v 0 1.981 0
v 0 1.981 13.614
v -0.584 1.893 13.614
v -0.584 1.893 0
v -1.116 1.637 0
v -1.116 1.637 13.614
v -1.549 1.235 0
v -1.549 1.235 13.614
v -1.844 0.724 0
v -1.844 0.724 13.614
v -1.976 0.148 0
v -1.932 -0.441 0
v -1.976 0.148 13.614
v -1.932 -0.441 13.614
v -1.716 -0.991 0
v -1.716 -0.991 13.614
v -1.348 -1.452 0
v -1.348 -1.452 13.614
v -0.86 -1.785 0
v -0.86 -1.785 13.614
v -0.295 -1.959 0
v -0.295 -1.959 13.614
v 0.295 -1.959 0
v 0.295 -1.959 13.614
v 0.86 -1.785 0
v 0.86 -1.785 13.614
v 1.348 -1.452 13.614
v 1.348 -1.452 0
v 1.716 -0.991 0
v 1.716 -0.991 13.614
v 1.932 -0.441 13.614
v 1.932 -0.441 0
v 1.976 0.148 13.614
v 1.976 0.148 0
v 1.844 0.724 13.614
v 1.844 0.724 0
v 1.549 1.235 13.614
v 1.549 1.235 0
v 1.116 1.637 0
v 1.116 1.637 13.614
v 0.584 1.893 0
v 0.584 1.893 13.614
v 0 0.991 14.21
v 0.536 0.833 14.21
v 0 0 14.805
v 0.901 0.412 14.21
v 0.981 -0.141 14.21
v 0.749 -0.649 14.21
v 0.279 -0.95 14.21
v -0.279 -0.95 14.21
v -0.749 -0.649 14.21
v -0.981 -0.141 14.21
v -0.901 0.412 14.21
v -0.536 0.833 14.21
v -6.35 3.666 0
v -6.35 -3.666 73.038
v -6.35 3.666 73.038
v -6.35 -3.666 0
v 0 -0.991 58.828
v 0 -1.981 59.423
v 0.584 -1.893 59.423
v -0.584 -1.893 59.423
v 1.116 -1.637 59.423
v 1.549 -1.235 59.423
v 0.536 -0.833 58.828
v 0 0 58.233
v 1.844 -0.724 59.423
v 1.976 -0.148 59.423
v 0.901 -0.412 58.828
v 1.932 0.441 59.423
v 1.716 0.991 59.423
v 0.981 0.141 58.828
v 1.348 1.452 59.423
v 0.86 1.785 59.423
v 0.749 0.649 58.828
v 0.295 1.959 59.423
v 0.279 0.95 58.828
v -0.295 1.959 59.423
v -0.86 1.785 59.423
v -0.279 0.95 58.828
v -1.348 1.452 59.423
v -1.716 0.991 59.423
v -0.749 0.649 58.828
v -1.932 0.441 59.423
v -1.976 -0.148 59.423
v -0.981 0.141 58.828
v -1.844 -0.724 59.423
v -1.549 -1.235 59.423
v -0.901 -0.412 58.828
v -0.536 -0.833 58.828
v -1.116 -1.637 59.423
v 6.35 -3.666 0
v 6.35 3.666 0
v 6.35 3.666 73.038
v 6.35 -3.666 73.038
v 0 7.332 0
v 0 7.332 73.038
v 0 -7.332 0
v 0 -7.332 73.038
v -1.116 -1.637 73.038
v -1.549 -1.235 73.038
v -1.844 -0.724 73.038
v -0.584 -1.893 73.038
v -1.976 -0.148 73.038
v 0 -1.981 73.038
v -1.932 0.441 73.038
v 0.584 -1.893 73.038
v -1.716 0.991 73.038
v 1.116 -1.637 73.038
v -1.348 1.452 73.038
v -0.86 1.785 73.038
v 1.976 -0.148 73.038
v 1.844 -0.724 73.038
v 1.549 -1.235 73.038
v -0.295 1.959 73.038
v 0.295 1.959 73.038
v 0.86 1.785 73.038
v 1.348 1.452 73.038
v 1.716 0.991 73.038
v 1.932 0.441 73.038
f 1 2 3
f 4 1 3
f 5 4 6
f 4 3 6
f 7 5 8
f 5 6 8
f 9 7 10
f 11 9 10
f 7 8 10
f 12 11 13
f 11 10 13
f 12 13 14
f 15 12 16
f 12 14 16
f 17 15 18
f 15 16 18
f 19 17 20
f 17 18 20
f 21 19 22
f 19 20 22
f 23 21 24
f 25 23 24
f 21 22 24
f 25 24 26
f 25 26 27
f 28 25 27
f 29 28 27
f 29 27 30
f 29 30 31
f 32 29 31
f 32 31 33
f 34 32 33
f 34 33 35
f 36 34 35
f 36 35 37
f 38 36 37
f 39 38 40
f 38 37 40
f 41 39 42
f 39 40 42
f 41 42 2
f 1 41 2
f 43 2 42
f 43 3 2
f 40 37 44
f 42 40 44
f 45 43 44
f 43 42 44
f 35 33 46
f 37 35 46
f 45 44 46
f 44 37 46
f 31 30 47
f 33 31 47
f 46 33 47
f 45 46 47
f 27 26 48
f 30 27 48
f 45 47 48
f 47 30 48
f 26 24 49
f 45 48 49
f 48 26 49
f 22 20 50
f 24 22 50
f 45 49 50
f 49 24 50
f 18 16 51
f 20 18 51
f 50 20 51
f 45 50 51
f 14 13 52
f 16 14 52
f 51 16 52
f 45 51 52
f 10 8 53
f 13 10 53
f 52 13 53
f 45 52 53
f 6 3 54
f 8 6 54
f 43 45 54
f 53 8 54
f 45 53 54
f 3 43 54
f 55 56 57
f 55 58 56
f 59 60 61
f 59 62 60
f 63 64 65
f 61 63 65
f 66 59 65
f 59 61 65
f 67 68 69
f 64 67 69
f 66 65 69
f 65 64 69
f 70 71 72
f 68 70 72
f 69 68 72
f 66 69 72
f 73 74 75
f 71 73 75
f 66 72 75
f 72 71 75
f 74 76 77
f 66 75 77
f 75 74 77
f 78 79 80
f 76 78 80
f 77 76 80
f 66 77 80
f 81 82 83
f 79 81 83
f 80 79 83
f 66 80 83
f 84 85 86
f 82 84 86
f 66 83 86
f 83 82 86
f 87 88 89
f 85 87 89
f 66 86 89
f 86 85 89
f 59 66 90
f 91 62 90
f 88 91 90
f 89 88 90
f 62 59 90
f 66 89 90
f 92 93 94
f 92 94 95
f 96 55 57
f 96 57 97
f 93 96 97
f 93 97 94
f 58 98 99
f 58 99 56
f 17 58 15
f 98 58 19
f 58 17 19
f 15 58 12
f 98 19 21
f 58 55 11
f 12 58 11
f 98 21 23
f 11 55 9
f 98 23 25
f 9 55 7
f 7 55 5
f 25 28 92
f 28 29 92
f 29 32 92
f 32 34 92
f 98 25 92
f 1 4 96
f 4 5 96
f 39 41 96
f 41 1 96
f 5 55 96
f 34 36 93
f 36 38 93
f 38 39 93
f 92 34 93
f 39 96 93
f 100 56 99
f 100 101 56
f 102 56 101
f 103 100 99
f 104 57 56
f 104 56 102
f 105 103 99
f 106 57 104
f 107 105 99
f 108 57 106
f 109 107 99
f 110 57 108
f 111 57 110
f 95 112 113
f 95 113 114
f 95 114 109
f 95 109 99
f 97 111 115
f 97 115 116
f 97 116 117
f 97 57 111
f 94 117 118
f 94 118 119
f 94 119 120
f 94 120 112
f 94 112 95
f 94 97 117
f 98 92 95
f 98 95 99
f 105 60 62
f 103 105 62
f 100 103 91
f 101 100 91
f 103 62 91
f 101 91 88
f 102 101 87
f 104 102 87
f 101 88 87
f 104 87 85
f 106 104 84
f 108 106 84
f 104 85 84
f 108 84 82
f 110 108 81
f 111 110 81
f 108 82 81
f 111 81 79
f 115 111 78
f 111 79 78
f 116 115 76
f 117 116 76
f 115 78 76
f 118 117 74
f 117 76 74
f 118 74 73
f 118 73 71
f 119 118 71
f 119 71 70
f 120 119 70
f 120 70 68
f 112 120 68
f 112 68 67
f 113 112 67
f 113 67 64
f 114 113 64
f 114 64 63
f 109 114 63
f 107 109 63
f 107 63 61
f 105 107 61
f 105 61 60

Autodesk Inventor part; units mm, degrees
ref_plane "YZ Plane" through (0, 0, 0) normal (1, 0, 0) x (0, 1, 0)
ref_plane "XZ Plane" through (0, 0, 0) normal (0, 1, 0) x (-1, 0, 0)
ref_plane "XY Plane" through (0, 0, 0) normal (0, 0, 1) x (1, 0, 0)
sketch "Sketch1" plane through (0, 0, 0) normal (0, 0, 1) x (1, 0, 0)
  line L0 (-6.35, -3.6662) -> (-6.35, 3.6662)
  line L1 (-6.35, 3.6662) -> (0, 7.3323)
  line L2 (0, 7.3323) -> (6.35, 3.6662)
  line L3 (6.35, 3.6662) -> (6.35, -3.6662)
  line L4 (6.35, -3.6662) -> (0, -7.3323)
  line L5 (0, -7.3323) -> (-6.35, -3.6662)
  point P0 (0, 0)
  point P1 (0, 0)
  dimension "d0" = 12.7
extrude "Extrusion1" add sketch "Sketch1" along normal blind 73.0377
sketch "Sketch2" plane through (0, 0, 73.0377) normal (0, 0, 1) x (1, 0, 0)
  point P0 (0, 0)
  point P1 (0, 0)
hole "Hole1" at (0, 0, 73.0377) direction (0, 0, -1) diameter 3.9624 depth 13.6144 tip angle 118 thread size "10-32 UNF" class "2B" standard "ANSI Unified Screw Threads"
sketch "Sketch3" plane through (0, 0, 0) normal (0, 0, -1) x (-1, 0, 0)
  circle A0 centre (0, 0) radius 1.9812 projected
hole "Hole2" at (0, 0, 0) direction (0, 0, 1) diameter 3.9624 depth 13.6144 tip angle 118 thread size "10-32 UNF" class "2B" standard "ANSI Unified Screw Threads"
properties part number "STOCK,HEX,SHAFT,TURRET,DRIVE" material "Aluminum 6061"
